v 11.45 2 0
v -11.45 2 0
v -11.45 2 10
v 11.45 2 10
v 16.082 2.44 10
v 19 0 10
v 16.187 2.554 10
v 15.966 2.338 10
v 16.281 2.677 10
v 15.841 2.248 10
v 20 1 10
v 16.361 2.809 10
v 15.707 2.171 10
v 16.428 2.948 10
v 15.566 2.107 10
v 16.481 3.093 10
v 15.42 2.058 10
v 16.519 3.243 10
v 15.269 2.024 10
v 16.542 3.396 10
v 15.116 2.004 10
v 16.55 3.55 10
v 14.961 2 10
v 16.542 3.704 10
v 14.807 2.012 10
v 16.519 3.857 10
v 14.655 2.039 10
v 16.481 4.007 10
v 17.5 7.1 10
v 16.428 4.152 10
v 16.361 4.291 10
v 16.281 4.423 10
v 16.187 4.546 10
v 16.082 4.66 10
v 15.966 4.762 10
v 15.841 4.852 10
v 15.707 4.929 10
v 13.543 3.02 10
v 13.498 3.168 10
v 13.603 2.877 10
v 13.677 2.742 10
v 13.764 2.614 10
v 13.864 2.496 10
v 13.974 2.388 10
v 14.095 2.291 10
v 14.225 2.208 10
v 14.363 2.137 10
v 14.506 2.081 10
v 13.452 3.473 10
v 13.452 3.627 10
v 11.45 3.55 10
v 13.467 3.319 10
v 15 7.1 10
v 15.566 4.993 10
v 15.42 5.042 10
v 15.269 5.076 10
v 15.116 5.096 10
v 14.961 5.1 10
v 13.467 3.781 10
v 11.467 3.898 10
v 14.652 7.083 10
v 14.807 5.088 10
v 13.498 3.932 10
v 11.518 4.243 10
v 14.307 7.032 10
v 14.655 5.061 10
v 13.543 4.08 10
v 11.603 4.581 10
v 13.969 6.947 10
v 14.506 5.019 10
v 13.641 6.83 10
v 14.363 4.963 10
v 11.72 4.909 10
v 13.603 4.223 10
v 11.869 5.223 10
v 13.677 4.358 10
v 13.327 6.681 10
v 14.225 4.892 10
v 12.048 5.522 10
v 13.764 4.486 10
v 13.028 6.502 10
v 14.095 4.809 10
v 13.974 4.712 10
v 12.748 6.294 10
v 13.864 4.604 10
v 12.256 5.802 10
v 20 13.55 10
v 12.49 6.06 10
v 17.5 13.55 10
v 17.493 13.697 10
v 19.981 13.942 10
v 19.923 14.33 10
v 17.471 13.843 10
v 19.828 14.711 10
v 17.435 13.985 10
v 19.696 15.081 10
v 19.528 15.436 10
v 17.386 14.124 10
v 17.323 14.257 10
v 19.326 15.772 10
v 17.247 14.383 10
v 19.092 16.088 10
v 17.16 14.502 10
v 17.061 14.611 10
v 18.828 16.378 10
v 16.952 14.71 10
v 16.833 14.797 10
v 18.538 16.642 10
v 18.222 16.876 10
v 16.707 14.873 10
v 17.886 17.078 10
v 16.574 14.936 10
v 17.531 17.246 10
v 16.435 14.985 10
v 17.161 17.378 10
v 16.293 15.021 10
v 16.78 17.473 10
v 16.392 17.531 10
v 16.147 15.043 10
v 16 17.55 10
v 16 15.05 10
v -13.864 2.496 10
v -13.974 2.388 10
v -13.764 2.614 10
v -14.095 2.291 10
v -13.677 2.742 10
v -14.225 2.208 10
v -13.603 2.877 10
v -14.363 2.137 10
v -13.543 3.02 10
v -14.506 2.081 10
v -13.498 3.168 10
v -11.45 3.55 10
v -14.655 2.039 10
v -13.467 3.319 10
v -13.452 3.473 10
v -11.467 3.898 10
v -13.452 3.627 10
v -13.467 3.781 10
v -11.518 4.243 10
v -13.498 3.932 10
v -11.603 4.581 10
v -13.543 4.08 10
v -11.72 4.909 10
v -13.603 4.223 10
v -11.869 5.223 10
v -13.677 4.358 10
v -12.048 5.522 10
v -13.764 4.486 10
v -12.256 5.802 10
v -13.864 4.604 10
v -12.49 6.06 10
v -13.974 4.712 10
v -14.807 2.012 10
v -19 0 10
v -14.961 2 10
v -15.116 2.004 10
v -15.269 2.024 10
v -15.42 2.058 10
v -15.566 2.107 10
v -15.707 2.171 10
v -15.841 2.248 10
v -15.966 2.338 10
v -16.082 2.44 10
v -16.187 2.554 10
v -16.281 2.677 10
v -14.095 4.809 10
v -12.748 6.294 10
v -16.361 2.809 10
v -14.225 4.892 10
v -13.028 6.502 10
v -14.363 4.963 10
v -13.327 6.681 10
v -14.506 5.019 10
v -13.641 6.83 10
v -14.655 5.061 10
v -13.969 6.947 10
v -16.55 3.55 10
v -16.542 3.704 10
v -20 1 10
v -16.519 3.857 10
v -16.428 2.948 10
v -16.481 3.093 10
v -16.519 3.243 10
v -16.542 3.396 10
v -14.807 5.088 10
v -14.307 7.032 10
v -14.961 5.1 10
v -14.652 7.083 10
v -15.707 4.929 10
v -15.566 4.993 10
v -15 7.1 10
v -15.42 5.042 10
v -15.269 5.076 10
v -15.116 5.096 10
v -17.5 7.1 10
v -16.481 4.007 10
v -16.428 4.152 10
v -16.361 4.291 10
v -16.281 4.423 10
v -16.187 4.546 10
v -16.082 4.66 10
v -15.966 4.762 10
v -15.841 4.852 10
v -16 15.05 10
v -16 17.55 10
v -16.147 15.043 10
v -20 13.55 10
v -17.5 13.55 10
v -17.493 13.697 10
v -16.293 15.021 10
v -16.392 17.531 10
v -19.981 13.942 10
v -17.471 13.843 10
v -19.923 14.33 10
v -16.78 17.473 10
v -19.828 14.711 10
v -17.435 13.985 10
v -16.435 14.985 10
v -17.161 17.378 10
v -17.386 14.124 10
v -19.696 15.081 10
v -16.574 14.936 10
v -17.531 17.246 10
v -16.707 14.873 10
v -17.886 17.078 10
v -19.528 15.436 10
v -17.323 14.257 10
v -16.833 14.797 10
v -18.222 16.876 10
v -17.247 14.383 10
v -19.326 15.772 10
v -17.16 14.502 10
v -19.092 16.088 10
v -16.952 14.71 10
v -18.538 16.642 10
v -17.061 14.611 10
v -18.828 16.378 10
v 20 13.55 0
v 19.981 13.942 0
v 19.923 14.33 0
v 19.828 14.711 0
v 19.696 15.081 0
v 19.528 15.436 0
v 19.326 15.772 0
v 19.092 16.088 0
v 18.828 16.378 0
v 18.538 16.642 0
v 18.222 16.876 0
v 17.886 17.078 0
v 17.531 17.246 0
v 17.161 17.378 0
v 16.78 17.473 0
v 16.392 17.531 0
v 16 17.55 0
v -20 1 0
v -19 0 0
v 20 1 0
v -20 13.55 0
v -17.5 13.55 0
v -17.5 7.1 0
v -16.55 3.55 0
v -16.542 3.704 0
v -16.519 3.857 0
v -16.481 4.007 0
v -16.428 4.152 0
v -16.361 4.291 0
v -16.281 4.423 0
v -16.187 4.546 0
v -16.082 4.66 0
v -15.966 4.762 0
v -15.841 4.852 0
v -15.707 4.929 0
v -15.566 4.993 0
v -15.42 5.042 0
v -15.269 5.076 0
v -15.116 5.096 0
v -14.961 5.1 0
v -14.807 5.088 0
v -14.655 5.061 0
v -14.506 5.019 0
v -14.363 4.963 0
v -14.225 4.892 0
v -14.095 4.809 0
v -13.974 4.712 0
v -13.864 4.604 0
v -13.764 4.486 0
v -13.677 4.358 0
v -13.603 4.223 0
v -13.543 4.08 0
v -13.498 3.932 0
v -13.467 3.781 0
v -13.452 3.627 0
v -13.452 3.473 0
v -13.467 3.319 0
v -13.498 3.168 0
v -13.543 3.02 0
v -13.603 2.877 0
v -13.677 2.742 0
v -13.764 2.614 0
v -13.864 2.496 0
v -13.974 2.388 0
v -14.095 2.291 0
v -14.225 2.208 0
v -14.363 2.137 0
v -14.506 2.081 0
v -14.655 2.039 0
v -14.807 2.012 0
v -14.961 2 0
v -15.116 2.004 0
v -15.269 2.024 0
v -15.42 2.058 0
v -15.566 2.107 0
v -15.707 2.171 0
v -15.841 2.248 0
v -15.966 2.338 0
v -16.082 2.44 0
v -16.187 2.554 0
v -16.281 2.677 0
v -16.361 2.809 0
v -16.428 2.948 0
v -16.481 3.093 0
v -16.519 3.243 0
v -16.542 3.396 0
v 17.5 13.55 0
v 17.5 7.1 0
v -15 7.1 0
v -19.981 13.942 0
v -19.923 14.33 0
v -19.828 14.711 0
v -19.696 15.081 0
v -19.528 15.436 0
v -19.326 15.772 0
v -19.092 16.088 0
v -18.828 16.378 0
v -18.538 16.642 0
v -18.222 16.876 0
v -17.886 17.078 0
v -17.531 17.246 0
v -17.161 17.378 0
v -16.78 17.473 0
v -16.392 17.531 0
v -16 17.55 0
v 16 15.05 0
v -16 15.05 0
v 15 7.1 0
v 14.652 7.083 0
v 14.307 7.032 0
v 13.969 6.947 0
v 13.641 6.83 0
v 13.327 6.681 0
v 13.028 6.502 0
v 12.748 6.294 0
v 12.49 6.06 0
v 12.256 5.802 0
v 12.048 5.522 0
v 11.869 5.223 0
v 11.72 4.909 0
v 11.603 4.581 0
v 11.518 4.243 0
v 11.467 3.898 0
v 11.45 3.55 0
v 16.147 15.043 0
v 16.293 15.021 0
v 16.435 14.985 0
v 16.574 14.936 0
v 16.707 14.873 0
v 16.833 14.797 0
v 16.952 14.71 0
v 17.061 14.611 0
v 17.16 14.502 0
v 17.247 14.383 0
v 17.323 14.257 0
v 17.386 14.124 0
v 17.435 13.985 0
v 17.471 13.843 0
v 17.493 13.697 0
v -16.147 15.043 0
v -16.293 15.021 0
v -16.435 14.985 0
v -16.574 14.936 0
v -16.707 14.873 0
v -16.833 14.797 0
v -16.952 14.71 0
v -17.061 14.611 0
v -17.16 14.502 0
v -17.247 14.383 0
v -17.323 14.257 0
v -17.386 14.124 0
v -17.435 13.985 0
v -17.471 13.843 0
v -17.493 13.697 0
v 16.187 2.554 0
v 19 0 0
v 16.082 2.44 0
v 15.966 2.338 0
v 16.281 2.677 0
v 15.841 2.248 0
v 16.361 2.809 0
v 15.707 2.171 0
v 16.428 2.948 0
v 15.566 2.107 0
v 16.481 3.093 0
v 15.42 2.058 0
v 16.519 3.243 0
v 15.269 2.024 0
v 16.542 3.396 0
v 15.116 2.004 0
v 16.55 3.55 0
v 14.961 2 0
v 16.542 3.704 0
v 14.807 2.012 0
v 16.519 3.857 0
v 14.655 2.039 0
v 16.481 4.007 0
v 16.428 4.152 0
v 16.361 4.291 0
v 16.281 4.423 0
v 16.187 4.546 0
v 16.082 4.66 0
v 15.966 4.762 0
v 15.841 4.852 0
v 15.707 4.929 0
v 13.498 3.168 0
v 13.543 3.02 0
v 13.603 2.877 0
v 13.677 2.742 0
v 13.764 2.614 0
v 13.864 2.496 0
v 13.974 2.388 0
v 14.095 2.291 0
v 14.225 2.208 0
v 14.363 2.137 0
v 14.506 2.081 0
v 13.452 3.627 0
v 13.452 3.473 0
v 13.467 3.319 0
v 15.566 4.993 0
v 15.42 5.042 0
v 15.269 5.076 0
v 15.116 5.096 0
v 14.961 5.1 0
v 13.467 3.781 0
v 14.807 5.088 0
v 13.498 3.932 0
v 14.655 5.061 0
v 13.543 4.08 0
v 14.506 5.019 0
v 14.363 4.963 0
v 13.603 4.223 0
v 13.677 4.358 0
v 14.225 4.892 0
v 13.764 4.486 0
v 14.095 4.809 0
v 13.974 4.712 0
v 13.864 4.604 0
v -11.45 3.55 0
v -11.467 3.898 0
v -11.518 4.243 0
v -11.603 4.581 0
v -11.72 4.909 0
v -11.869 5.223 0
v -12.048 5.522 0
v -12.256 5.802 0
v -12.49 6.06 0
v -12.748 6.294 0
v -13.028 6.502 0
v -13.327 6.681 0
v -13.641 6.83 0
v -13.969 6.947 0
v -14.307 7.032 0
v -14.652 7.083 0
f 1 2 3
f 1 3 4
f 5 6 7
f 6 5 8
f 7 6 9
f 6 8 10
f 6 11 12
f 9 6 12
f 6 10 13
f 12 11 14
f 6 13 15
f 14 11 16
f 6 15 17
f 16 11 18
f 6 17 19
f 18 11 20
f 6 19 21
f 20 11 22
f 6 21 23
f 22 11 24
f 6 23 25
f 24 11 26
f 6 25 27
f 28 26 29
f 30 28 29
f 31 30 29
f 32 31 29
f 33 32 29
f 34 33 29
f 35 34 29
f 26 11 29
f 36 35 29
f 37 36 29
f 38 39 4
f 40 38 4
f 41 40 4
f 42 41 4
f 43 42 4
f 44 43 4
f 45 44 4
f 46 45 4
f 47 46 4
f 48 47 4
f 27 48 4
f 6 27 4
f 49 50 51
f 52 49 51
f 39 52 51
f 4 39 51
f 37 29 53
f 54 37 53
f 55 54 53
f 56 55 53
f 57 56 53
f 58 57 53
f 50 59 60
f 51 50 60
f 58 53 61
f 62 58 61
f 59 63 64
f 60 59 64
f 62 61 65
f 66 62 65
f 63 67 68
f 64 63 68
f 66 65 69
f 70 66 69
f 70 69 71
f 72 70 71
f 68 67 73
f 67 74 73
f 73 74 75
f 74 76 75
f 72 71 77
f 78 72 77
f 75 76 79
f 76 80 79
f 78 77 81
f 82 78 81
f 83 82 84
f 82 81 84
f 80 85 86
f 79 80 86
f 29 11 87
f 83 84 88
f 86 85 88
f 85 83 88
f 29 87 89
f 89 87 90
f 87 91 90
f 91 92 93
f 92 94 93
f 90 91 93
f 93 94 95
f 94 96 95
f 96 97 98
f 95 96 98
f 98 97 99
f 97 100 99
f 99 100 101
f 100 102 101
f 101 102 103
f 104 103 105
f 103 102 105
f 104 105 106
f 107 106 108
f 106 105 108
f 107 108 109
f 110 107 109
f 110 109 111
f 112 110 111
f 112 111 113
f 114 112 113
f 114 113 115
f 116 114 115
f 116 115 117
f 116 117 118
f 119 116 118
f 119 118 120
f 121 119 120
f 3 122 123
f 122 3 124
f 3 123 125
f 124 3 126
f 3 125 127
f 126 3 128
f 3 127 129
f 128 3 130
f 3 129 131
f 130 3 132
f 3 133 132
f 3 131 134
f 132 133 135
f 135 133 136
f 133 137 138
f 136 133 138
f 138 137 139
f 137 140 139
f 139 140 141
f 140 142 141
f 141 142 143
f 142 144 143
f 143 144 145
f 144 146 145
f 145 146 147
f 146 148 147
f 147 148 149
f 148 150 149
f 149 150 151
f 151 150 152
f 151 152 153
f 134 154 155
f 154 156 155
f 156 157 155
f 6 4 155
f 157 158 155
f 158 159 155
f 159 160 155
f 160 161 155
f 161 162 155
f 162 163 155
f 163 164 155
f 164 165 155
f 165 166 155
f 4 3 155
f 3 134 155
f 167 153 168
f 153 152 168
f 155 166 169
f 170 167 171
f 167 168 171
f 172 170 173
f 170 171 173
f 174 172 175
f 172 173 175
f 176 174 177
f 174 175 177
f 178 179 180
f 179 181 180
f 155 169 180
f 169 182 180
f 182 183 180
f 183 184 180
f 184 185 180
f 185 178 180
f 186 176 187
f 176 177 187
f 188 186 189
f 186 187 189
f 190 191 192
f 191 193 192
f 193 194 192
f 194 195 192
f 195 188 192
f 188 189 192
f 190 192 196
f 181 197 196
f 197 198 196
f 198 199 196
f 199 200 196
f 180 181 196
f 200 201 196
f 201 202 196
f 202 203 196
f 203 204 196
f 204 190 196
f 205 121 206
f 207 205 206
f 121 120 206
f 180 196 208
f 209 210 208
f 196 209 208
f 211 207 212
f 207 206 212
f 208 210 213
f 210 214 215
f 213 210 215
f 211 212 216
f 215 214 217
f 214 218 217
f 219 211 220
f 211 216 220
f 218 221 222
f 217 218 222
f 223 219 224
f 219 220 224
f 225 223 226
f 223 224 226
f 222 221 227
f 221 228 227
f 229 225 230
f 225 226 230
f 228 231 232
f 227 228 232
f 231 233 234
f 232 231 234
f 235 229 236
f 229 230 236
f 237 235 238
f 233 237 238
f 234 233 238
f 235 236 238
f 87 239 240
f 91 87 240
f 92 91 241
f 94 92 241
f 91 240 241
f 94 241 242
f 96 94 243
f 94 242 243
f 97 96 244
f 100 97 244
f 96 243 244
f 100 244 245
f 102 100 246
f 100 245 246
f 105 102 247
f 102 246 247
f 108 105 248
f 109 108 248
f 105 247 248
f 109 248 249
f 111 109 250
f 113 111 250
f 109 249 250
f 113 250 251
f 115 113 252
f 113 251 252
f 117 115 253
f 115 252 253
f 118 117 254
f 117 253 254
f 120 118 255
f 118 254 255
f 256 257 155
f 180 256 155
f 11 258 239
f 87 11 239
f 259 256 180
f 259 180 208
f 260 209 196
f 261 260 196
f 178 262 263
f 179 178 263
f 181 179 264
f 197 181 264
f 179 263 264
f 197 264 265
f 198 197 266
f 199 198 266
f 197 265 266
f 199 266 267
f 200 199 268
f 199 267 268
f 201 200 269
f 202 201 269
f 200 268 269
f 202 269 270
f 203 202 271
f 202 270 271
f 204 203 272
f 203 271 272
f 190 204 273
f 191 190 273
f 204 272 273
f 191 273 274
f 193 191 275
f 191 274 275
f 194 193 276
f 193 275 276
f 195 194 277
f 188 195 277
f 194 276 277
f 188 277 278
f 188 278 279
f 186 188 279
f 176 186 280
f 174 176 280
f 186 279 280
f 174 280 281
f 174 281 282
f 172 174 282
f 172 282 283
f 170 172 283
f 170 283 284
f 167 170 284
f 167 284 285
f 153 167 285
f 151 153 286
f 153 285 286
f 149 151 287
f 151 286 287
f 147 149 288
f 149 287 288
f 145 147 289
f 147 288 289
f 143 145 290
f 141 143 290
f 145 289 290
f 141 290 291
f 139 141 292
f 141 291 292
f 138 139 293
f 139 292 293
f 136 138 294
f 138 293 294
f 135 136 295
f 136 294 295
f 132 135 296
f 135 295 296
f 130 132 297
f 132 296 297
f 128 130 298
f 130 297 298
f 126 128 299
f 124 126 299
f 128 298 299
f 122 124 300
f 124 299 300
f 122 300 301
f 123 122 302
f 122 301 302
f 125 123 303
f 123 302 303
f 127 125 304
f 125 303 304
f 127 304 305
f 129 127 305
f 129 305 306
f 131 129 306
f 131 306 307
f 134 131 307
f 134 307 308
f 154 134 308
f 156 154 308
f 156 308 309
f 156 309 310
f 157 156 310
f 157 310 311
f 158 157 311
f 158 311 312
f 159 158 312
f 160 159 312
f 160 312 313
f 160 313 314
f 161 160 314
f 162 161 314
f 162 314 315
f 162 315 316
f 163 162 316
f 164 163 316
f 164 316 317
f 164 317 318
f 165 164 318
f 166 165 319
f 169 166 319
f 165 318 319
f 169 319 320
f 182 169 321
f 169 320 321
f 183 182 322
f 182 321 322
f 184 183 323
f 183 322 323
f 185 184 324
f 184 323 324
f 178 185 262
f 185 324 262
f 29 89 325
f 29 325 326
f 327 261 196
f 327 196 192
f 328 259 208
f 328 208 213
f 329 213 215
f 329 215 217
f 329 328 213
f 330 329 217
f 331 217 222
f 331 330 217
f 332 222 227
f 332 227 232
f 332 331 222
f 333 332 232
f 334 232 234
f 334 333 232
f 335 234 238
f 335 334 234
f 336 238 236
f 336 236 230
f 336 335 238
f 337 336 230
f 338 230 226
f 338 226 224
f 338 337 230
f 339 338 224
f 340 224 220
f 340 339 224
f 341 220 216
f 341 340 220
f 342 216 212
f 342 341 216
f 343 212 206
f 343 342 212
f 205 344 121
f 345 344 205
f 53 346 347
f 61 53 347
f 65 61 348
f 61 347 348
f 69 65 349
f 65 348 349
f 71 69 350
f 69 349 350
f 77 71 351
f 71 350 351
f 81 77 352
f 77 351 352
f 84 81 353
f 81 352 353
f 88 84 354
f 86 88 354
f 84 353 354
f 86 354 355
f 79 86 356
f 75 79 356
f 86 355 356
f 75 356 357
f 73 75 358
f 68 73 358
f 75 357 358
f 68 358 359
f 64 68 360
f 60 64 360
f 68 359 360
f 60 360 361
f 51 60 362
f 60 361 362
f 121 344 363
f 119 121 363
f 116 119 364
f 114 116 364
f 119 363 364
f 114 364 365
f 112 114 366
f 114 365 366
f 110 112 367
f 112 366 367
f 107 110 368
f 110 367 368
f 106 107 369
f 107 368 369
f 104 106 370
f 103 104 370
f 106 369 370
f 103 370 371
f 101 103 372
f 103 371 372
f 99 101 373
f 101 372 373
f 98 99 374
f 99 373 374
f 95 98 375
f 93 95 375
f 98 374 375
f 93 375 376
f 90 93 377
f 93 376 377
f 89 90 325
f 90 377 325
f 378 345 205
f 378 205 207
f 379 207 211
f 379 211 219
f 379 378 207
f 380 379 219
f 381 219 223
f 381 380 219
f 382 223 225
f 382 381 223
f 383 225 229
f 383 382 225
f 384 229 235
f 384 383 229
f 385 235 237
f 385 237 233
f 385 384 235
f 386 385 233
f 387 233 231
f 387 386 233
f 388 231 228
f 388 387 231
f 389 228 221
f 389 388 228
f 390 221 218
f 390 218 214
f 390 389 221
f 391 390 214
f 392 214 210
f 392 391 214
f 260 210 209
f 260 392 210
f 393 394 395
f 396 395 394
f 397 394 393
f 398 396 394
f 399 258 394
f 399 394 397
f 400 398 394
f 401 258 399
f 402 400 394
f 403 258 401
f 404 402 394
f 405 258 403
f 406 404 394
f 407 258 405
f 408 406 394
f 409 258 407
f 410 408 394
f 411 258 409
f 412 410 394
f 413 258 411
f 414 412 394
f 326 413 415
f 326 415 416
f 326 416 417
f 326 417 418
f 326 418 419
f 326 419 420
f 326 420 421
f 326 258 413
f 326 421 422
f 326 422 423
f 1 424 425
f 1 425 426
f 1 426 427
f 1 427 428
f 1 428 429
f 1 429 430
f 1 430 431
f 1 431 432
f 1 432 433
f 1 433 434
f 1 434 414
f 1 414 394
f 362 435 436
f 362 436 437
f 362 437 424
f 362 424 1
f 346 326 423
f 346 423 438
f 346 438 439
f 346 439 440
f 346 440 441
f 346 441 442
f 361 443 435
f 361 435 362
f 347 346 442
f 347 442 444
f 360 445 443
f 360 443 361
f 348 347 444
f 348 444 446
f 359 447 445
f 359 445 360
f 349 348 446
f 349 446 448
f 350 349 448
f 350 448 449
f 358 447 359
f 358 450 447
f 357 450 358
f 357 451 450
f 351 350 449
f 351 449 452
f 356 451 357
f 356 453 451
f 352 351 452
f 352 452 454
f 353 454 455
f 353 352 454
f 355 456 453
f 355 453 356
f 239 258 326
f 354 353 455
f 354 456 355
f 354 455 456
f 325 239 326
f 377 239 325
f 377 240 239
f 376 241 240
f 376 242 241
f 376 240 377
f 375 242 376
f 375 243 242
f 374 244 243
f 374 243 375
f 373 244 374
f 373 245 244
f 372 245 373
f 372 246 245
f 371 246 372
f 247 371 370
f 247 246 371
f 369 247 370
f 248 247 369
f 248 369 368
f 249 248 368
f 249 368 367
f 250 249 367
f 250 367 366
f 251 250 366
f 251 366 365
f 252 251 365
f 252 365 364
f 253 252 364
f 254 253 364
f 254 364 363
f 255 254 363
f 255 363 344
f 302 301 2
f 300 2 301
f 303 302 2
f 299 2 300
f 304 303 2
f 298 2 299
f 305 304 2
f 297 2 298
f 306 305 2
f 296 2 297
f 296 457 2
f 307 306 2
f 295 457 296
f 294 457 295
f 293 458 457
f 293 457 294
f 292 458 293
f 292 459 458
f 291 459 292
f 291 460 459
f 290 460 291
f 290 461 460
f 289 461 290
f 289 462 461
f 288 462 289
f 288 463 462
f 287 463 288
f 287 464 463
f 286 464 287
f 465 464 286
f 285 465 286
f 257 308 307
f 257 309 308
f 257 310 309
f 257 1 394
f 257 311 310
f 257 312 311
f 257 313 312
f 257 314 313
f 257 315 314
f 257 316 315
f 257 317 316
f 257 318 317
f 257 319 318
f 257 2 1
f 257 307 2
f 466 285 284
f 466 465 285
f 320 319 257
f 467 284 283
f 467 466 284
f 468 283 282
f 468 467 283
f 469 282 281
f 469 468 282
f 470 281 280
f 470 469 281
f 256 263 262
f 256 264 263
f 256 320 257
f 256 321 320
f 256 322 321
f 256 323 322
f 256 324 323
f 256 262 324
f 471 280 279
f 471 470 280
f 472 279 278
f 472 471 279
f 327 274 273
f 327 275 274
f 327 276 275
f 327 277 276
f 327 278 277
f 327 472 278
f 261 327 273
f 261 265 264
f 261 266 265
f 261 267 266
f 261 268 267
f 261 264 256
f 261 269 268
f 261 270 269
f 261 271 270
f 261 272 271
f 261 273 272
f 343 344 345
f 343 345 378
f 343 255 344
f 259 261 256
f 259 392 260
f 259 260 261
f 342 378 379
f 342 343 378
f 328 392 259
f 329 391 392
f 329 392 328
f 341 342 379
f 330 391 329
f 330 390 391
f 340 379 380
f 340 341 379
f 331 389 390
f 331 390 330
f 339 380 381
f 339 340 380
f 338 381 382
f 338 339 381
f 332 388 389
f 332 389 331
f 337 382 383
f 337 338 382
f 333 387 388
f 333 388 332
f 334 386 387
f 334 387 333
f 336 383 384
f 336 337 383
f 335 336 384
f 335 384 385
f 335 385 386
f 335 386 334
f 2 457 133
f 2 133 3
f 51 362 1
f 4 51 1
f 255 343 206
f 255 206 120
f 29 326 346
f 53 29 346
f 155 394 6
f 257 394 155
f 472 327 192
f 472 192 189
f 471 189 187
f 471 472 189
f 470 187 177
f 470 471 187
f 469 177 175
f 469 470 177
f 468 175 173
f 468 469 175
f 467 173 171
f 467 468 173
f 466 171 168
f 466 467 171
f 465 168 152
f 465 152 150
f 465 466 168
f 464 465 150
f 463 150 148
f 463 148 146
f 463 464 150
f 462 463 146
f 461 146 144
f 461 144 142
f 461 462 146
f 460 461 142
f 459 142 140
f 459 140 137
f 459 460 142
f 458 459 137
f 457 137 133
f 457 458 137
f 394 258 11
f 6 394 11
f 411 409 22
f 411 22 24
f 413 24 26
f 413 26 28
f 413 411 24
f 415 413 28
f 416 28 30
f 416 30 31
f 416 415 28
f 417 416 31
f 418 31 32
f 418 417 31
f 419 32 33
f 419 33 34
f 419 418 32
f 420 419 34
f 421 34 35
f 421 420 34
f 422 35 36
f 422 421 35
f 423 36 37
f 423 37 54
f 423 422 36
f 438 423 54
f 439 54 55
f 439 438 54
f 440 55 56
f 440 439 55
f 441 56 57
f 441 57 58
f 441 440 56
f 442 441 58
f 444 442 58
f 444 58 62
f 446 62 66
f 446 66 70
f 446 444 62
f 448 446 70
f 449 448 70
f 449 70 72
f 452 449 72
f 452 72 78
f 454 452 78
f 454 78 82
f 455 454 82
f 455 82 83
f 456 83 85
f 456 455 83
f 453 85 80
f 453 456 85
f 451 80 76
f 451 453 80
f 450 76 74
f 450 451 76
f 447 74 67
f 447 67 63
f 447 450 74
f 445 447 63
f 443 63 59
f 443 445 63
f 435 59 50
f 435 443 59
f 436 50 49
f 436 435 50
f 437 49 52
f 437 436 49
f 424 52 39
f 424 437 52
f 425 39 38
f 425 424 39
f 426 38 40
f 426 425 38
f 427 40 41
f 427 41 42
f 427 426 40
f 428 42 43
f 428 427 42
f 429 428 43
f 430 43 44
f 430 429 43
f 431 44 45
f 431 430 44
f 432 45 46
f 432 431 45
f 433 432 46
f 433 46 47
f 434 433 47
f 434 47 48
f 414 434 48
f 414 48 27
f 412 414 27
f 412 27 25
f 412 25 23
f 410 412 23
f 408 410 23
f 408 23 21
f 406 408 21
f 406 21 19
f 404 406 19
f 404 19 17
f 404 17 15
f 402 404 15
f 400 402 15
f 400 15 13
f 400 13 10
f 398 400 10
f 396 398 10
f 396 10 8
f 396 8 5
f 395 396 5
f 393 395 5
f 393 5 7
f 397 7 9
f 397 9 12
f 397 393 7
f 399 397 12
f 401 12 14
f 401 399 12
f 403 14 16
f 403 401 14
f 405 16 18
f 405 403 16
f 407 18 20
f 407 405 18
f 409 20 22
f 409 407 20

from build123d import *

# Parameters (mm, degrees)
F0_R     = 1.55
F1_DEPTH = 10
F3_SIZE  = 1


with BuildPart() as f1:
    # F0 (on Top) → F1 (new body)
    with BuildSketch(Plane.XY):
        with BuildLine():
            Line((16, 17.55), (0, 17.55))
            Line((0, 17.55), (0, 15.05))
            Line((0, 15.05), (16, 15.05))
            ThreePointArc((16, 15.05), (17.0606601718, 14.6106601718), (17.5, 13.55))
            Line((17.5, 13.55), (17.5, 7.1))
            Line((17.5, 7.1), (15, 7.1))
            ThreePointArc((15, 7.1), (12.4897709268, 6.0602290732), (11.45, 3.55))
            Line((11.45, 3.55), (11.45, 2))
            Line((11.45, 2), (0, 2))
            Line((0, 2), (0, 0))
            Line((0, 0), (20, 0))
            Line((20, 0), (20, 13.55))
            ThreePointArc((20, 13.55), (18.8284271247, 16.3784271247), (16, 17.55))
        make_face()
        with Locations((15, 3.55)):
            Circle(F0_R, mode=Mode.SUBTRACT)
    extrude(amount=F1_DEPTH)

    # F2: F1 across face


with BuildPart() as f1_1:
    add(f1.part)
    add(f1.part.mirror(Plane(origin=(0, 16.3, 5), x_dir=(0, -1, 0), z_dir=(-1, 0, 0))))

    # F3
    f3_edges = [f1_1.edges().sort_by_distance(p)[0] for p in [
        (-20, 0, 5),
        (20, 0, 5),
    ]]
    chamfer(f3_edges, length=F3_SIZE)


solid = f1_1.part
